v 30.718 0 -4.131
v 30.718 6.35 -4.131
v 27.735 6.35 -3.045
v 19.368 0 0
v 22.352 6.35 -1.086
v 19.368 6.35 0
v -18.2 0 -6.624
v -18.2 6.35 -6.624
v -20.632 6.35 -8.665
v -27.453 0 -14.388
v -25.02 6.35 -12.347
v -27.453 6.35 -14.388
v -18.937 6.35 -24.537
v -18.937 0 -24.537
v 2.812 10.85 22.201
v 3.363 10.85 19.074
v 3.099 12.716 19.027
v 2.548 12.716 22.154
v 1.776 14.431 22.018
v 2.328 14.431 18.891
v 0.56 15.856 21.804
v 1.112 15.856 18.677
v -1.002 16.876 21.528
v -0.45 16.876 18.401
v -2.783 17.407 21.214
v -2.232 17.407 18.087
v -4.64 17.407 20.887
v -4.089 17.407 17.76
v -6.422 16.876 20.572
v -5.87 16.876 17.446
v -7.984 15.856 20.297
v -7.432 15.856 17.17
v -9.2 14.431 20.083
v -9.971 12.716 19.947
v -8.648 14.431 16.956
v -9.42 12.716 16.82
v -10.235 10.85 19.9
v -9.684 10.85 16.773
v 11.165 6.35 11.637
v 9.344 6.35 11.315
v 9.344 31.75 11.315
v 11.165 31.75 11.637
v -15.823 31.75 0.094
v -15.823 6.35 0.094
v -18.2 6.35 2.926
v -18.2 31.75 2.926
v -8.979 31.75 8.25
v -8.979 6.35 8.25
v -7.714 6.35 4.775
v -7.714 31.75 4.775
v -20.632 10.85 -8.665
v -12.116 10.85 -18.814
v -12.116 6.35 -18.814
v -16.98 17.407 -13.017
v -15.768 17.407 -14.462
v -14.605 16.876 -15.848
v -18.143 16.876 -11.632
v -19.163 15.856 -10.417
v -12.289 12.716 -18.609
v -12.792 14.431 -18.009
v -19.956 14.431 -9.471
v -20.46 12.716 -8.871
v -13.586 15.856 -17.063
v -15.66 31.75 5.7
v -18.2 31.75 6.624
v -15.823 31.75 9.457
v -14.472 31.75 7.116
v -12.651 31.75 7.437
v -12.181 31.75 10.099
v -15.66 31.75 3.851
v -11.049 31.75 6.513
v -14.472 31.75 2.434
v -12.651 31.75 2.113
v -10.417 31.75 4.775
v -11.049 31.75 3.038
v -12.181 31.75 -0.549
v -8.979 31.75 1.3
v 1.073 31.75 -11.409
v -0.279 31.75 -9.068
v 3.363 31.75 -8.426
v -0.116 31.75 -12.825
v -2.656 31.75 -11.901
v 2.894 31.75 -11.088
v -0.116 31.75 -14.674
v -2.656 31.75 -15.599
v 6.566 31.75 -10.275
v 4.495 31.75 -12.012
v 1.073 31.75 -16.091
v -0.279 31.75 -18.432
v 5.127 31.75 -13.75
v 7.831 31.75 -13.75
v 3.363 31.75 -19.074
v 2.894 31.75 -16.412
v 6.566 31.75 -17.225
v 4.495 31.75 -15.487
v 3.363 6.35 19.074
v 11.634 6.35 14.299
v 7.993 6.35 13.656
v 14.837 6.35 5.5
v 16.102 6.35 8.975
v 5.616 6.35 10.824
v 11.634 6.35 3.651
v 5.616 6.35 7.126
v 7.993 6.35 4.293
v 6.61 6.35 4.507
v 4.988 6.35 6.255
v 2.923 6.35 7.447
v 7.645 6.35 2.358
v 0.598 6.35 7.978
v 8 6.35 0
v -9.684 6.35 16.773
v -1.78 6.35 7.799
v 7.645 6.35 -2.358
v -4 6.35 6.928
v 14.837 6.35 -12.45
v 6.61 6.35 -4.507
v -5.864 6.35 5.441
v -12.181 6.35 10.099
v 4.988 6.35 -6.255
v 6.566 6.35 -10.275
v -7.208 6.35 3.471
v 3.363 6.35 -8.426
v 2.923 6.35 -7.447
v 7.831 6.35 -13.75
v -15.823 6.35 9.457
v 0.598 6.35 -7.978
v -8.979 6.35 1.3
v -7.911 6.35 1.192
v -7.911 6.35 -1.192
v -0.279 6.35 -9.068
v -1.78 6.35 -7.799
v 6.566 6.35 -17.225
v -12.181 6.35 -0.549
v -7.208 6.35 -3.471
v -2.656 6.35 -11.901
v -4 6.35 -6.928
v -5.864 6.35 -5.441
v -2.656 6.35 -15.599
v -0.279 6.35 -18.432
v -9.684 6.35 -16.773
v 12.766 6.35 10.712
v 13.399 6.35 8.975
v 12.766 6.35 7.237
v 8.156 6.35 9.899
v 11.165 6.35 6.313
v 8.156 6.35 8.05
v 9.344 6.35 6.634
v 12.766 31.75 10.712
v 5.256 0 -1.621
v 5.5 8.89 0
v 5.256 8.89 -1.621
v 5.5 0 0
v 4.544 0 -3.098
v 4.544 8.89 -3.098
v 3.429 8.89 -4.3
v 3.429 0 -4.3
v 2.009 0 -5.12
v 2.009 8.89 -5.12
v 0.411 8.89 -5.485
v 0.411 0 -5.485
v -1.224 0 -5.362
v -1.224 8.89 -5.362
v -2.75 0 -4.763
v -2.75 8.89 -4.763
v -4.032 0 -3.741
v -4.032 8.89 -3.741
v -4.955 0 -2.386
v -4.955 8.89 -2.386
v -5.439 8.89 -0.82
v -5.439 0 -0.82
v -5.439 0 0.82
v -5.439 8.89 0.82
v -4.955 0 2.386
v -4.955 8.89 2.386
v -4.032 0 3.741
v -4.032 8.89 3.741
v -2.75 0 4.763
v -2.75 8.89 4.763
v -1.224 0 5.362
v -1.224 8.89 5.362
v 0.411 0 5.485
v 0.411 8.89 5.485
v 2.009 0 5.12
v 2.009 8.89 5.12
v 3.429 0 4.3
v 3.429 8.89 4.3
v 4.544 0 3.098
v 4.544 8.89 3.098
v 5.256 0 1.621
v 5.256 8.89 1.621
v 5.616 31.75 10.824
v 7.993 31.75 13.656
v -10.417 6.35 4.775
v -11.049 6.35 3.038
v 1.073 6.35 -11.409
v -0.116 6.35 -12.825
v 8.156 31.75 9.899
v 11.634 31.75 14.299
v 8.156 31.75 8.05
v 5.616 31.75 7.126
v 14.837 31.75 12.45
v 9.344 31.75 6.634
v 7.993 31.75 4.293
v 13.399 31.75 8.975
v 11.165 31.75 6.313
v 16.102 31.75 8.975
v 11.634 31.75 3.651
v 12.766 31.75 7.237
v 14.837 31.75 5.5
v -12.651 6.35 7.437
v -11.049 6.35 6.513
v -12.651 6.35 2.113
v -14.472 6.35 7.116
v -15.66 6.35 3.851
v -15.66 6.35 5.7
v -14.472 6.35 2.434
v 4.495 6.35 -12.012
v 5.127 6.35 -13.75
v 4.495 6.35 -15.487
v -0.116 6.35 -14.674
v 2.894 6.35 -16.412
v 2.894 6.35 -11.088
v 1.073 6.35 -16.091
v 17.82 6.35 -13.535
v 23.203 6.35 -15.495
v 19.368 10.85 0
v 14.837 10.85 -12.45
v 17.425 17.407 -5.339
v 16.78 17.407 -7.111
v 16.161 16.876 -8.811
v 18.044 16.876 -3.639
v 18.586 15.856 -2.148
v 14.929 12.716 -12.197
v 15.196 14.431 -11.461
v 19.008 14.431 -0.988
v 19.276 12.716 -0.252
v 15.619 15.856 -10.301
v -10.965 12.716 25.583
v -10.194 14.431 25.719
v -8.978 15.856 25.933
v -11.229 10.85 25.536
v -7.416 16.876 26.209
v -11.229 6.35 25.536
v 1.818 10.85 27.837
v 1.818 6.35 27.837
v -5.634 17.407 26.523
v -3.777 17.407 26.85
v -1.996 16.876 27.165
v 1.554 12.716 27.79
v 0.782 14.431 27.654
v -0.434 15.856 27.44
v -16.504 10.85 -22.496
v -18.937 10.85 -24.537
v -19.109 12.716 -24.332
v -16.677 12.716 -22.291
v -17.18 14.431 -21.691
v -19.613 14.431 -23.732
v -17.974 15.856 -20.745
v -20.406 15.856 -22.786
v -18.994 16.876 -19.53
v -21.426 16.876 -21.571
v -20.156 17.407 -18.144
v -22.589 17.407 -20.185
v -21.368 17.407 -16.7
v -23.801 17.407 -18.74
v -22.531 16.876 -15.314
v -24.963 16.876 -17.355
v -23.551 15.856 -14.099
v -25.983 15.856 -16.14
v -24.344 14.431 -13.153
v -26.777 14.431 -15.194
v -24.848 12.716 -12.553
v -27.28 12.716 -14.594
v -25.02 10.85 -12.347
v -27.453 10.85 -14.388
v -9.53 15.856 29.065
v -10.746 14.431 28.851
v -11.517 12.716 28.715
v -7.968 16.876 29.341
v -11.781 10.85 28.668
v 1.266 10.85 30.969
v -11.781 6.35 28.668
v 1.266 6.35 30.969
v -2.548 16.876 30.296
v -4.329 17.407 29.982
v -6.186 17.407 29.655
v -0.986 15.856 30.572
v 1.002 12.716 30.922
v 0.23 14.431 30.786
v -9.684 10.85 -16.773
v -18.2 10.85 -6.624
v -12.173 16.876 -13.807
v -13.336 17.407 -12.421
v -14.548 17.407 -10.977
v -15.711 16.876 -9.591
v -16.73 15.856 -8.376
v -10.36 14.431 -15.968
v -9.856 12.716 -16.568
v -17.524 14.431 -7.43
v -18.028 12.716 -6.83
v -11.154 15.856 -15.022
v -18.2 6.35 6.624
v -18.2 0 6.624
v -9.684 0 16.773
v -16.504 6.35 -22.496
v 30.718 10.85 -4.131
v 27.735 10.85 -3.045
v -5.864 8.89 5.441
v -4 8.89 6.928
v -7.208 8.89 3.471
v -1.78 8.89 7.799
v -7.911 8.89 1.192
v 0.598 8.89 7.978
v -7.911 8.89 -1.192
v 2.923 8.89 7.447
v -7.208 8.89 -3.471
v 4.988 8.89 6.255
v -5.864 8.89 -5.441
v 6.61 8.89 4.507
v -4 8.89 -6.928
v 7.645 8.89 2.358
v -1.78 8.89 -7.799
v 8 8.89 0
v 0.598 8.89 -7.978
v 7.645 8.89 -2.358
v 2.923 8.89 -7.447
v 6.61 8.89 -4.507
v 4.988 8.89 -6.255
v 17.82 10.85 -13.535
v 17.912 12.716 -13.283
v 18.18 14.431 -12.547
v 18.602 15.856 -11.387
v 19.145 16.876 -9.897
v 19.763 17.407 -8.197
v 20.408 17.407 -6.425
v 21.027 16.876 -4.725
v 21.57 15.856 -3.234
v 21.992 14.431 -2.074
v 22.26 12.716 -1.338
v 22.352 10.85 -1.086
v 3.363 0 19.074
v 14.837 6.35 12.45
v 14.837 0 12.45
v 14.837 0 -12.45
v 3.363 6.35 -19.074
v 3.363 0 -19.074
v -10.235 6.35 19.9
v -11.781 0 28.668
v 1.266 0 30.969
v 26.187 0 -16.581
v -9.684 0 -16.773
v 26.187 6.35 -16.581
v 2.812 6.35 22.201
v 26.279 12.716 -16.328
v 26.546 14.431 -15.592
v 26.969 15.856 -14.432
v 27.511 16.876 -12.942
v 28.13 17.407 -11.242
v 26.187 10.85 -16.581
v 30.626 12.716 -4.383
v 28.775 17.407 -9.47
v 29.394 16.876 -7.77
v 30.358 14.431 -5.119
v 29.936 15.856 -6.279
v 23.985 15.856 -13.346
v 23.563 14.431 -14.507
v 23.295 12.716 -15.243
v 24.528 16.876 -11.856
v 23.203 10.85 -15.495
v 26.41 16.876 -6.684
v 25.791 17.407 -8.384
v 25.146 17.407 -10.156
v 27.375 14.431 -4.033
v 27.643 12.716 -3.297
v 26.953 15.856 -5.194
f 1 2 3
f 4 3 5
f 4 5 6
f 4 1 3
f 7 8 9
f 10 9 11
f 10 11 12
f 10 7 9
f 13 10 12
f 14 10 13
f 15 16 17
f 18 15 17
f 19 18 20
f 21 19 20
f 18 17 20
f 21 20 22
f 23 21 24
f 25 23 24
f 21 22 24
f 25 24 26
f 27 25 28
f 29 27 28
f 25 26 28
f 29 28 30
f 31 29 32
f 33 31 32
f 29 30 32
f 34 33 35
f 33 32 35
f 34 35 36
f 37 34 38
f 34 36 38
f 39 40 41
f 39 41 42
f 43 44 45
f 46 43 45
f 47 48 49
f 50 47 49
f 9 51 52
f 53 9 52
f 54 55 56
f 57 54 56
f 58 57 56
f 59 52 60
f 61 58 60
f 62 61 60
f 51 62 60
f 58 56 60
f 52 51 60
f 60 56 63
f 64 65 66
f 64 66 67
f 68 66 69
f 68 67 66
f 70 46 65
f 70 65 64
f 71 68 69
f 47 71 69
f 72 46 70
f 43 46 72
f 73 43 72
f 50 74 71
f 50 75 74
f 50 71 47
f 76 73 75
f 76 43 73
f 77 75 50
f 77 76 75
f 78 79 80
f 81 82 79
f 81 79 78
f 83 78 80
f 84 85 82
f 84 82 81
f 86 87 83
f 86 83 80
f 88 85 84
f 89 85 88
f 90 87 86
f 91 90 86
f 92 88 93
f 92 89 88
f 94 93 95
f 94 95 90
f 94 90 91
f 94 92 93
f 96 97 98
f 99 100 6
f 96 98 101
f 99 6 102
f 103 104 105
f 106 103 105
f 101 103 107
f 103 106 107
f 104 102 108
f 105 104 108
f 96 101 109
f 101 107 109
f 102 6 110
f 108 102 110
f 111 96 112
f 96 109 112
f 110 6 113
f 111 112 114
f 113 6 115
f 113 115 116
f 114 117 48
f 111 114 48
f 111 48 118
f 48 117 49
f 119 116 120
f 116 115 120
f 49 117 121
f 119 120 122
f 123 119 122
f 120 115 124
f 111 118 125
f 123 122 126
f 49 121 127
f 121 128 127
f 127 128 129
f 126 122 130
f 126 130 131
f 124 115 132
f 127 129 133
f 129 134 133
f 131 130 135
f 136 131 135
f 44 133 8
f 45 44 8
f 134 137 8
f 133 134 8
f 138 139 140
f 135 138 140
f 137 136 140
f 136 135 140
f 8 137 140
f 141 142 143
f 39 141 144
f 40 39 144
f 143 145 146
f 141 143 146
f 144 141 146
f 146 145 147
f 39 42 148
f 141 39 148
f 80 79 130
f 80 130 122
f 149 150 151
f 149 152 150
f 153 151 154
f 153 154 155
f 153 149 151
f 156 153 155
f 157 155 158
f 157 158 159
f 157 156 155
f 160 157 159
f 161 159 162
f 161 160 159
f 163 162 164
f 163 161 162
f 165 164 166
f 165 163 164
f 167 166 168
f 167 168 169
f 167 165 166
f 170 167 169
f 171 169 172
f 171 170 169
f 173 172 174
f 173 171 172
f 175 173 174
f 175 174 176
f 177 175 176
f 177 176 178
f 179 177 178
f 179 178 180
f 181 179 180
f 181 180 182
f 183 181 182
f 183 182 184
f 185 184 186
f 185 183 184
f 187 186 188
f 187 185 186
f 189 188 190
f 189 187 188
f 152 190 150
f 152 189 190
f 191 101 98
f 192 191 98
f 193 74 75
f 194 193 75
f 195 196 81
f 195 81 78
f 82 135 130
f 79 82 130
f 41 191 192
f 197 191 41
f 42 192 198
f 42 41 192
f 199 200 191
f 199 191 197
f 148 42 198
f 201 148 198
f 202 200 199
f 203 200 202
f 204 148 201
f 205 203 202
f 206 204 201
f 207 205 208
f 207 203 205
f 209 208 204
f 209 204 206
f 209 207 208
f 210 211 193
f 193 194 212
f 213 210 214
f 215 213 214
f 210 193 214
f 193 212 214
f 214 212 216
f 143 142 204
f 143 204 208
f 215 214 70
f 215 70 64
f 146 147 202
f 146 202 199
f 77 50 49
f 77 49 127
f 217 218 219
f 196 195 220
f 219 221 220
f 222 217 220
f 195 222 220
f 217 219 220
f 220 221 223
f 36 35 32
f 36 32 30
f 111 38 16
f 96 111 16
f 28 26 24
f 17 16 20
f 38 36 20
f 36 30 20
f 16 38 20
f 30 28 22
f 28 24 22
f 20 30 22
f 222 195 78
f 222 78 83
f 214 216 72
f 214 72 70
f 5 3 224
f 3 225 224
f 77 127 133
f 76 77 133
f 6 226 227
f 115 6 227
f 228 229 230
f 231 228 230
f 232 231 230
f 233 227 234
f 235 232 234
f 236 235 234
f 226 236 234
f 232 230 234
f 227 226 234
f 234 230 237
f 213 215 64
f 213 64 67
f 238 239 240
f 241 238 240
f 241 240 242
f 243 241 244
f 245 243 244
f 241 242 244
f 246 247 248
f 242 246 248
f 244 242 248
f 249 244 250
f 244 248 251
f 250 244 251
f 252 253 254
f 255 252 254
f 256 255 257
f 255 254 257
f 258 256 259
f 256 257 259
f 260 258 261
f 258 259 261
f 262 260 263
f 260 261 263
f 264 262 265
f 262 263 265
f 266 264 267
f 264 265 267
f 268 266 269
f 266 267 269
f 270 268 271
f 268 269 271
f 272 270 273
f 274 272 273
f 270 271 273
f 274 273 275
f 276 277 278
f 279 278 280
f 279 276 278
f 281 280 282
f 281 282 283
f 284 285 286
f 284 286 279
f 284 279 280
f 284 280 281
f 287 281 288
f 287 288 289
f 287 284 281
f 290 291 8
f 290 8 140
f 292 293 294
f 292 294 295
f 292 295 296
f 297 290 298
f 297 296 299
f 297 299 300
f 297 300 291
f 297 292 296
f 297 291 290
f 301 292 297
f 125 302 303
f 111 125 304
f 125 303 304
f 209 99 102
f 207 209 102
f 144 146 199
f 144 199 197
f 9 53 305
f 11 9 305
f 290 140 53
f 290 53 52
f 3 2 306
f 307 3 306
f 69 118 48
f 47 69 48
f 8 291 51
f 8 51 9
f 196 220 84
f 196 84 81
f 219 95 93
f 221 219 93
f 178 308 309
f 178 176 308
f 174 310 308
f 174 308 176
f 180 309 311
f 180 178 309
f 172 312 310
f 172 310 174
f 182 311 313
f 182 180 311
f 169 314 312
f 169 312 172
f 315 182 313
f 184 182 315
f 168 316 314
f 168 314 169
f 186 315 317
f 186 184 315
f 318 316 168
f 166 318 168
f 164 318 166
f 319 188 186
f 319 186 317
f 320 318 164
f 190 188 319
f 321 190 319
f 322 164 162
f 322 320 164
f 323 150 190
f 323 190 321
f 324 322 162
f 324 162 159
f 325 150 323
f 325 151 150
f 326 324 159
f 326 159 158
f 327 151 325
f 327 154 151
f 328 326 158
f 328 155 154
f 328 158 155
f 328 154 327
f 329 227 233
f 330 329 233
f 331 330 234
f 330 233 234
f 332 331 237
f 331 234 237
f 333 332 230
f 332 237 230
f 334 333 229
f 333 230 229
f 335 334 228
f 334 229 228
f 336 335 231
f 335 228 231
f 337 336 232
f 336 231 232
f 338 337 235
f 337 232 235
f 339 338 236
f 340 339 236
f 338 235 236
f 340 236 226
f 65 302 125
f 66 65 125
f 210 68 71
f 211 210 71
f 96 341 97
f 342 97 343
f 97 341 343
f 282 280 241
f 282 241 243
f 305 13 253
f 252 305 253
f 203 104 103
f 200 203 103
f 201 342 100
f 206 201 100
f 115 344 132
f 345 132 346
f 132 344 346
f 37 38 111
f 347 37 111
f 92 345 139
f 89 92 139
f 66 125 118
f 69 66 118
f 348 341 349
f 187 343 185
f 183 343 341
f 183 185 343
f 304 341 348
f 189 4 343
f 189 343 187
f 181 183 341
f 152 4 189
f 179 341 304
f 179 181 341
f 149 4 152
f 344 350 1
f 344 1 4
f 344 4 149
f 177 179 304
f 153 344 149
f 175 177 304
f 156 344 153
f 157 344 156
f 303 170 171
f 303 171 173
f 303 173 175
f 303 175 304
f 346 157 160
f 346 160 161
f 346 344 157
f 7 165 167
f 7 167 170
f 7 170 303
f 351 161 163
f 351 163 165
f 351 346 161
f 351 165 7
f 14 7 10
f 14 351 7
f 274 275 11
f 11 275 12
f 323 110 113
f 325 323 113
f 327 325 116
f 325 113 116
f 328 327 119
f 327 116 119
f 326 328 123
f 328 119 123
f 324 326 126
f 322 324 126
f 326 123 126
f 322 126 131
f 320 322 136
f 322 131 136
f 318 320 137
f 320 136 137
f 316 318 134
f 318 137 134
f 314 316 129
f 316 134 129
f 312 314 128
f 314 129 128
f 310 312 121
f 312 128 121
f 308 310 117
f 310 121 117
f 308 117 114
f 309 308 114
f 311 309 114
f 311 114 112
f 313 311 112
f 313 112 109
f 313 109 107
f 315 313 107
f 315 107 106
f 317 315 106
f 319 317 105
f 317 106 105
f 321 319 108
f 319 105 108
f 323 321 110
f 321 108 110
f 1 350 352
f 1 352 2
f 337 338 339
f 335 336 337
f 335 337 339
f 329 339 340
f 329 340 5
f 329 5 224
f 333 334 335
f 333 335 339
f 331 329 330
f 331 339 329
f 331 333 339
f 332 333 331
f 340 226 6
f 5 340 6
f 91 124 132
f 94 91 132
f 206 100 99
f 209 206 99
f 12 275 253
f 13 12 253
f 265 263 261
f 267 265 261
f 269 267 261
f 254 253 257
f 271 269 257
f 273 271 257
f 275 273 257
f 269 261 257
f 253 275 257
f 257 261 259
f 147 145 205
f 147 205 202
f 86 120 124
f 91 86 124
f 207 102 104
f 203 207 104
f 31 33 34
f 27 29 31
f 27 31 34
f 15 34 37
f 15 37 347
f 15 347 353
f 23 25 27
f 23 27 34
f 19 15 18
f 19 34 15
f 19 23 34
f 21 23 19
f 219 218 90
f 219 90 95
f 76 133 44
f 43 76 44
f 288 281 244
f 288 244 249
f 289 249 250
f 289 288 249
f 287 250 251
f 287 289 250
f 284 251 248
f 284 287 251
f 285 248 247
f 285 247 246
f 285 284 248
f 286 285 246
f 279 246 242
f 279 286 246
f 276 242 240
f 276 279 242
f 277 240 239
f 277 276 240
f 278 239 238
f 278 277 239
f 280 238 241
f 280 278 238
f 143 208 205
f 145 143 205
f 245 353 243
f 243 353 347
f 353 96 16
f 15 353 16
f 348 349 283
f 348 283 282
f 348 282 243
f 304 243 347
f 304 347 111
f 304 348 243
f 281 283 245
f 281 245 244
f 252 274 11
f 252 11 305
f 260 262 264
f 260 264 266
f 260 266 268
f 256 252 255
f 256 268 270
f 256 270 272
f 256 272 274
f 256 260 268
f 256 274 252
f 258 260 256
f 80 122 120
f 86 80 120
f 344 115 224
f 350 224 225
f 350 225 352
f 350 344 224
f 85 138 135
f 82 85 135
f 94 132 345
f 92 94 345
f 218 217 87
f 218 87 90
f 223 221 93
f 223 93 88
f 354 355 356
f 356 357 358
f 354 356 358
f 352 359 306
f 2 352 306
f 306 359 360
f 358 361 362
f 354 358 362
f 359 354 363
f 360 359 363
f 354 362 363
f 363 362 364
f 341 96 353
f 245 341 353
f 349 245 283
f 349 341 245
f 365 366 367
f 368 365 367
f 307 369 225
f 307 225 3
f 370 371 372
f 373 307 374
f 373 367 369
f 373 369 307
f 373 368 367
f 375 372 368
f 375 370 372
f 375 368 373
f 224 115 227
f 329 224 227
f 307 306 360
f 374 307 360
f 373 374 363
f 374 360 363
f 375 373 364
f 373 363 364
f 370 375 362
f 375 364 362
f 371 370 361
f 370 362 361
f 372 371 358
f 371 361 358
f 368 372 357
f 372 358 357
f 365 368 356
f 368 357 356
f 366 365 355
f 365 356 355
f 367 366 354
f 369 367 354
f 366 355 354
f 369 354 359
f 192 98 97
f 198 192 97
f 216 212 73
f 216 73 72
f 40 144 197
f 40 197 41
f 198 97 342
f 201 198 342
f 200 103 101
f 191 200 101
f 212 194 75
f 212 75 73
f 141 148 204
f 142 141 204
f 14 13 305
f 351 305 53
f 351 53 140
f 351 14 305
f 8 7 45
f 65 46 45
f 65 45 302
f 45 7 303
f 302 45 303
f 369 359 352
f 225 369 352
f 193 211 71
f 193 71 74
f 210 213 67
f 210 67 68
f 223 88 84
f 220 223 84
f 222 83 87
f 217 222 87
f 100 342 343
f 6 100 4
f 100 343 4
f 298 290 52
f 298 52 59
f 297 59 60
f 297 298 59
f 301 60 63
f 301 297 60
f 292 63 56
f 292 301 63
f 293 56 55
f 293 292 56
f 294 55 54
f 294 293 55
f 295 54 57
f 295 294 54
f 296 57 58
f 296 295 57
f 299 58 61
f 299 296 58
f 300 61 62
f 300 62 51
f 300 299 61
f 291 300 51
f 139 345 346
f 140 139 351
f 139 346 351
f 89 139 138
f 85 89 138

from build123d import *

# Parameters (mm, degrees)
SKETCH1_R            = 5.5
BOSS_EXTRUDE1_DEPTH  = 6.35
BOSS_EXTRUDE2_DEPTH  = 3.18
BOSS_EXTRUDE4_DEPTH  = 3.175
BOSS_EXTRUDE5_DEPTH  = 3.175
BOSS_EXTRUDE6_DEPTH  = 3.175
BOSS_EXTRUDE7_DEPTH  = 3.175
BOSS_EXTRUDE8_DEPTH  = 3.175
BOSS_EXTRUDE9_DEPTH  = 25.4
SKETCH15_R           = 8
SKETCH15_R_2         = 5.5
BOSS_EXTRUDE10_DEPTH = 2.54


with BuildPart() as part:
    # Sketch1 → Boss-Extrude1 (new body)
    with BuildSketch(Plane(origin=(0, 0, 0), x_dir=(1, 0, 0), z_dir=(0, 1, 0))):
        Polygon((1.265828837, -30.968710893), (-11.781412955, -28.668130141), (-9.68401773, -16.773210729), (3.363224062, -19.073791481), align=None)
        Polygon((-9.68401773, -16.773210729), (3.363224062, -19.073791481), (14.836775938, -12.449533217), (19.368035459, 0), (14.836775938, 12.449533217), (3.363224062, 19.073791481), (-9.68401773, 16.773210729), (-18.2, 6.624258264), (-18.2, -6.624258264), align=None)
        Circle(SKETCH1_R, mode=Mode.SUBTRACT)
        Polygon((26.186775938, 16.580595376), (30.718035459, 4.131062159), (19.368035459, 0), (14.836775938, 12.449533217), align=None)
        Polygon((-27.452604774, 14.388115517), (-18.936622504, 24.537067982), (-9.68401773, 16.773210729), (-18.2, 6.624258264), align=None)
    extrude(amount=BOSS_EXTRUDE1_DEPTH)

    # Sketch4 → Boss-Extrude2 (add)
    with BuildSketch(Plane(origin=(-5.257792059, 0, 29.818420517), x_dir=(-0.984807753, 0, -0.173648178), z_dir=(0.173648178, 0, -0.984807753))):
        with BuildLine():
            Line((-6.624258264, 6.35), (-6.624258264, 10.84999989))
            ThreePointArc((-6.624258264, 10.84999989), (0, 17.474258154), (6.624258264, 10.84999989))
            Line((6.624258264, 10.84999989), (6.624258264, 6.35))
            Line((6.624258264, 6.35), (-6.624258264, 6.35))
        make_face()
    extrude(amount=BOSS_EXTRUDE2_DEPTH)

    # Sketch6 → Boss-Extrude4 (add)
    with BuildSketch(Plane(origin=(-3.160396834, 0, 17.923501105), x_dir=(-0.984807753, 0, -0.173648178), z_dir=(0.173648178, 0, -0.984807753))):
        with BuildLine():
            Line((-6.624258264, 6.35), (-6.624258264, 10.85))
            ThreePointArc((-6.624258264, 10.85), (0, 17.474258264), (6.624258264, 10.85))
            Line((6.624258264, 10.85), (6.624258264, 6.35))
            Line((6.624258264, 6.35), (-6.624258264, 6.35))
        make_face()
    extrude(amount=-BOSS_EXTRUDE4_DEPTH)

    # Sketch8 → Boss-Extrude5 (add)
    with BuildSketch(Plane(origin=(28.452405698, 0, -10.355828767), x_dir=(0.342020143, 0, 0.939692621), z_dir=(-0.939692621, 0, 0.342020143))):
        with BuildLine():
            Line((-6.624258264, 10.85), (-6.624258264, 6.35))
            Line((-6.624258264, 6.35), (6.624258264, 6.35))
            Line((6.624258264, 6.35), (6.624258264, 10.85))
            ThreePointArc((6.624258264, 10.85), (0, 17.474258264), (-6.624258264, 10.85))
        make_face()
    extrude(amount=BOSS_EXTRUDE5_DEPTH)

    # Sketch9 → Boss-Extrude6 (add)
    with BuildSketch(Plane(origin=(17.102405698, 0, -6.224766609), x_dir=(0.342020143, 0, 0.939692621), z_dir=(-0.939692621, 0, 0.342020143))):
        with BuildLine():
            Line((-6.624258264, 6.35), (-6.624258264, 10.85))
            ThreePointArc((-6.624258264, 10.85), (0, 17.474258264), (6.624258264, 10.85))
            Line((6.624258264, 10.85), (6.624258264, 6.35))
            Line((6.624258264, 6.35), (-6.624258264, 6.35))
        make_face()
    extrude(amount=-BOSS_EXTRUDE6_DEPTH)

    # Sketch10 → Boss-Extrude7 (add)
    with BuildSketch(Plane(origin=(-23.194613639, 0, -19.46259175), x_dir=(0.64278761, 0, -0.766044443), z_dir=(0.766044443, 0, 0.64278761))):
        with BuildLine():
            Line((-6.624258264, 10.85), (-6.624258264, 6.35))
            Line((-6.624258264, 6.35), (6.624258264, 6.35))
            Line((6.624258264, 6.35), (6.624258264, 10.85))
            ThreePointArc((6.624258264, 10.85), (0, 17.474258264), (-6.624258264, 10.85))
        make_face()
    extrude(amount=BOSS_EXTRUDE7_DEPTH)

    # Sketch11 → Boss-Extrude8 (add)
    with BuildSketch(Plane(origin=(-13.942008865, 0, -11.698734496), x_dir=(0.64278761, 0, -0.766044443), z_dir=(0.766044443, 0, 0.64278761))):
        with BuildLine():
            Line((-6.624258264, 10.85), (-6.624258264, 6.35))
            Line((-6.624258264, 6.35), (6.624258264, 6.35))
            Line((6.624258264, 6.35), (6.624258264, 10.85))
            ThreePointArc((6.624258264, 10.85), (0, 17.474258264), (-6.624258264, 10.85))
        make_face()
    extrude(amount=-BOSS_EXTRUDE8_DEPTH)

    # Sketch12 → Boss-Extrude9 (add)
    with BuildSketch(Plane(origin=(0, 6.35, 0), x_dir=(1, 0, 0), z_dir=(0, 1, 0))):
        Polygon((14.836775938, -12.449533217), (16.101545079, -8.974608561), (14.836775938, -5.499683905), (11.634268052, -3.650715115), (7.992510452, -4.292855237), (5.615521995, -7.125639771), (5.615521995, -10.823577351), (7.992510452, -13.656361885), (11.634268052, -14.298502007), align=None)
        Polygon((12.766148966, -10.712070889), (13.398533537, -8.974608561), (12.766148966, -7.237146233), (11.164895023, -6.312661838), (9.344016223, -6.633731899), (8.155521995, -8.050124166), (8.155521995, -9.899092956), (9.344016223, -11.315485223), (11.164895023, -11.636555284), align=None, mode=Mode.SUBTRACT)
        Polygon((6.565731948, 10.274973378), (7.83050109, 13.749898034), (6.565731948, 17.224822691), (3.363224062, 19.073791481), (-0.278533537, 18.431651359), (-2.655521995, 15.598866825), (-2.655521995, 11.900929244), (-0.278533537, 9.06814471), (3.363224062, 8.426004588), align=None)
        Polygon((-0.115521995, 12.825413639), (1.072972234, 11.409021372), (2.893851034, 11.087951311), (4.495104977, 12.012435706), (5.127489548, 13.749898034), (4.495104977, 15.487360363), (2.893851034, 16.411844758), (1.072972234, 16.090774697), (-0.115521995, 14.674382429), align=None, mode=Mode.SUBTRACT)
        Polygon((-18.2, -6.624258264), (-15.823011542, -9.457042798), (-12.181253943, -10.09918292), (-8.978746057, -8.25021413), (-7.713976916, -4.775289474), (-8.978746057, -1.300364817), (-12.181253943, 0.548603973), (-15.823011542, -0.093536149), (-18.2, -2.926320684), align=None)
        Polygon((-11.049373028, -6.512751802), (-10.416988458, -4.775289474), (-11.049373028, -3.037827145), (-12.650626972, -2.11334275), (-14.471505771, -2.434412811), (-15.66, -3.850805079), (-15.66, -5.699773869), (-14.471505771, -7.116166136), (-12.650626972, -7.437236197), align=None, mode=Mode.SUBTRACT)
    extrude(amount=BOSS_EXTRUDE9_DEPTH)

    # Sketch15 → Boss-Extrude10 (add)
    with BuildSketch(Plane(origin=(0, 6.35, 0), x_dir=(1, 0, 0), z_dir=(0, 1, 0))):
        Circle(SKETCH15_R)
        Circle(SKETCH15_R_2, mode=Mode.SUBTRACT)
    extrude(amount=BOSS_EXTRUDE10_DEPTH)


solid = part.part
